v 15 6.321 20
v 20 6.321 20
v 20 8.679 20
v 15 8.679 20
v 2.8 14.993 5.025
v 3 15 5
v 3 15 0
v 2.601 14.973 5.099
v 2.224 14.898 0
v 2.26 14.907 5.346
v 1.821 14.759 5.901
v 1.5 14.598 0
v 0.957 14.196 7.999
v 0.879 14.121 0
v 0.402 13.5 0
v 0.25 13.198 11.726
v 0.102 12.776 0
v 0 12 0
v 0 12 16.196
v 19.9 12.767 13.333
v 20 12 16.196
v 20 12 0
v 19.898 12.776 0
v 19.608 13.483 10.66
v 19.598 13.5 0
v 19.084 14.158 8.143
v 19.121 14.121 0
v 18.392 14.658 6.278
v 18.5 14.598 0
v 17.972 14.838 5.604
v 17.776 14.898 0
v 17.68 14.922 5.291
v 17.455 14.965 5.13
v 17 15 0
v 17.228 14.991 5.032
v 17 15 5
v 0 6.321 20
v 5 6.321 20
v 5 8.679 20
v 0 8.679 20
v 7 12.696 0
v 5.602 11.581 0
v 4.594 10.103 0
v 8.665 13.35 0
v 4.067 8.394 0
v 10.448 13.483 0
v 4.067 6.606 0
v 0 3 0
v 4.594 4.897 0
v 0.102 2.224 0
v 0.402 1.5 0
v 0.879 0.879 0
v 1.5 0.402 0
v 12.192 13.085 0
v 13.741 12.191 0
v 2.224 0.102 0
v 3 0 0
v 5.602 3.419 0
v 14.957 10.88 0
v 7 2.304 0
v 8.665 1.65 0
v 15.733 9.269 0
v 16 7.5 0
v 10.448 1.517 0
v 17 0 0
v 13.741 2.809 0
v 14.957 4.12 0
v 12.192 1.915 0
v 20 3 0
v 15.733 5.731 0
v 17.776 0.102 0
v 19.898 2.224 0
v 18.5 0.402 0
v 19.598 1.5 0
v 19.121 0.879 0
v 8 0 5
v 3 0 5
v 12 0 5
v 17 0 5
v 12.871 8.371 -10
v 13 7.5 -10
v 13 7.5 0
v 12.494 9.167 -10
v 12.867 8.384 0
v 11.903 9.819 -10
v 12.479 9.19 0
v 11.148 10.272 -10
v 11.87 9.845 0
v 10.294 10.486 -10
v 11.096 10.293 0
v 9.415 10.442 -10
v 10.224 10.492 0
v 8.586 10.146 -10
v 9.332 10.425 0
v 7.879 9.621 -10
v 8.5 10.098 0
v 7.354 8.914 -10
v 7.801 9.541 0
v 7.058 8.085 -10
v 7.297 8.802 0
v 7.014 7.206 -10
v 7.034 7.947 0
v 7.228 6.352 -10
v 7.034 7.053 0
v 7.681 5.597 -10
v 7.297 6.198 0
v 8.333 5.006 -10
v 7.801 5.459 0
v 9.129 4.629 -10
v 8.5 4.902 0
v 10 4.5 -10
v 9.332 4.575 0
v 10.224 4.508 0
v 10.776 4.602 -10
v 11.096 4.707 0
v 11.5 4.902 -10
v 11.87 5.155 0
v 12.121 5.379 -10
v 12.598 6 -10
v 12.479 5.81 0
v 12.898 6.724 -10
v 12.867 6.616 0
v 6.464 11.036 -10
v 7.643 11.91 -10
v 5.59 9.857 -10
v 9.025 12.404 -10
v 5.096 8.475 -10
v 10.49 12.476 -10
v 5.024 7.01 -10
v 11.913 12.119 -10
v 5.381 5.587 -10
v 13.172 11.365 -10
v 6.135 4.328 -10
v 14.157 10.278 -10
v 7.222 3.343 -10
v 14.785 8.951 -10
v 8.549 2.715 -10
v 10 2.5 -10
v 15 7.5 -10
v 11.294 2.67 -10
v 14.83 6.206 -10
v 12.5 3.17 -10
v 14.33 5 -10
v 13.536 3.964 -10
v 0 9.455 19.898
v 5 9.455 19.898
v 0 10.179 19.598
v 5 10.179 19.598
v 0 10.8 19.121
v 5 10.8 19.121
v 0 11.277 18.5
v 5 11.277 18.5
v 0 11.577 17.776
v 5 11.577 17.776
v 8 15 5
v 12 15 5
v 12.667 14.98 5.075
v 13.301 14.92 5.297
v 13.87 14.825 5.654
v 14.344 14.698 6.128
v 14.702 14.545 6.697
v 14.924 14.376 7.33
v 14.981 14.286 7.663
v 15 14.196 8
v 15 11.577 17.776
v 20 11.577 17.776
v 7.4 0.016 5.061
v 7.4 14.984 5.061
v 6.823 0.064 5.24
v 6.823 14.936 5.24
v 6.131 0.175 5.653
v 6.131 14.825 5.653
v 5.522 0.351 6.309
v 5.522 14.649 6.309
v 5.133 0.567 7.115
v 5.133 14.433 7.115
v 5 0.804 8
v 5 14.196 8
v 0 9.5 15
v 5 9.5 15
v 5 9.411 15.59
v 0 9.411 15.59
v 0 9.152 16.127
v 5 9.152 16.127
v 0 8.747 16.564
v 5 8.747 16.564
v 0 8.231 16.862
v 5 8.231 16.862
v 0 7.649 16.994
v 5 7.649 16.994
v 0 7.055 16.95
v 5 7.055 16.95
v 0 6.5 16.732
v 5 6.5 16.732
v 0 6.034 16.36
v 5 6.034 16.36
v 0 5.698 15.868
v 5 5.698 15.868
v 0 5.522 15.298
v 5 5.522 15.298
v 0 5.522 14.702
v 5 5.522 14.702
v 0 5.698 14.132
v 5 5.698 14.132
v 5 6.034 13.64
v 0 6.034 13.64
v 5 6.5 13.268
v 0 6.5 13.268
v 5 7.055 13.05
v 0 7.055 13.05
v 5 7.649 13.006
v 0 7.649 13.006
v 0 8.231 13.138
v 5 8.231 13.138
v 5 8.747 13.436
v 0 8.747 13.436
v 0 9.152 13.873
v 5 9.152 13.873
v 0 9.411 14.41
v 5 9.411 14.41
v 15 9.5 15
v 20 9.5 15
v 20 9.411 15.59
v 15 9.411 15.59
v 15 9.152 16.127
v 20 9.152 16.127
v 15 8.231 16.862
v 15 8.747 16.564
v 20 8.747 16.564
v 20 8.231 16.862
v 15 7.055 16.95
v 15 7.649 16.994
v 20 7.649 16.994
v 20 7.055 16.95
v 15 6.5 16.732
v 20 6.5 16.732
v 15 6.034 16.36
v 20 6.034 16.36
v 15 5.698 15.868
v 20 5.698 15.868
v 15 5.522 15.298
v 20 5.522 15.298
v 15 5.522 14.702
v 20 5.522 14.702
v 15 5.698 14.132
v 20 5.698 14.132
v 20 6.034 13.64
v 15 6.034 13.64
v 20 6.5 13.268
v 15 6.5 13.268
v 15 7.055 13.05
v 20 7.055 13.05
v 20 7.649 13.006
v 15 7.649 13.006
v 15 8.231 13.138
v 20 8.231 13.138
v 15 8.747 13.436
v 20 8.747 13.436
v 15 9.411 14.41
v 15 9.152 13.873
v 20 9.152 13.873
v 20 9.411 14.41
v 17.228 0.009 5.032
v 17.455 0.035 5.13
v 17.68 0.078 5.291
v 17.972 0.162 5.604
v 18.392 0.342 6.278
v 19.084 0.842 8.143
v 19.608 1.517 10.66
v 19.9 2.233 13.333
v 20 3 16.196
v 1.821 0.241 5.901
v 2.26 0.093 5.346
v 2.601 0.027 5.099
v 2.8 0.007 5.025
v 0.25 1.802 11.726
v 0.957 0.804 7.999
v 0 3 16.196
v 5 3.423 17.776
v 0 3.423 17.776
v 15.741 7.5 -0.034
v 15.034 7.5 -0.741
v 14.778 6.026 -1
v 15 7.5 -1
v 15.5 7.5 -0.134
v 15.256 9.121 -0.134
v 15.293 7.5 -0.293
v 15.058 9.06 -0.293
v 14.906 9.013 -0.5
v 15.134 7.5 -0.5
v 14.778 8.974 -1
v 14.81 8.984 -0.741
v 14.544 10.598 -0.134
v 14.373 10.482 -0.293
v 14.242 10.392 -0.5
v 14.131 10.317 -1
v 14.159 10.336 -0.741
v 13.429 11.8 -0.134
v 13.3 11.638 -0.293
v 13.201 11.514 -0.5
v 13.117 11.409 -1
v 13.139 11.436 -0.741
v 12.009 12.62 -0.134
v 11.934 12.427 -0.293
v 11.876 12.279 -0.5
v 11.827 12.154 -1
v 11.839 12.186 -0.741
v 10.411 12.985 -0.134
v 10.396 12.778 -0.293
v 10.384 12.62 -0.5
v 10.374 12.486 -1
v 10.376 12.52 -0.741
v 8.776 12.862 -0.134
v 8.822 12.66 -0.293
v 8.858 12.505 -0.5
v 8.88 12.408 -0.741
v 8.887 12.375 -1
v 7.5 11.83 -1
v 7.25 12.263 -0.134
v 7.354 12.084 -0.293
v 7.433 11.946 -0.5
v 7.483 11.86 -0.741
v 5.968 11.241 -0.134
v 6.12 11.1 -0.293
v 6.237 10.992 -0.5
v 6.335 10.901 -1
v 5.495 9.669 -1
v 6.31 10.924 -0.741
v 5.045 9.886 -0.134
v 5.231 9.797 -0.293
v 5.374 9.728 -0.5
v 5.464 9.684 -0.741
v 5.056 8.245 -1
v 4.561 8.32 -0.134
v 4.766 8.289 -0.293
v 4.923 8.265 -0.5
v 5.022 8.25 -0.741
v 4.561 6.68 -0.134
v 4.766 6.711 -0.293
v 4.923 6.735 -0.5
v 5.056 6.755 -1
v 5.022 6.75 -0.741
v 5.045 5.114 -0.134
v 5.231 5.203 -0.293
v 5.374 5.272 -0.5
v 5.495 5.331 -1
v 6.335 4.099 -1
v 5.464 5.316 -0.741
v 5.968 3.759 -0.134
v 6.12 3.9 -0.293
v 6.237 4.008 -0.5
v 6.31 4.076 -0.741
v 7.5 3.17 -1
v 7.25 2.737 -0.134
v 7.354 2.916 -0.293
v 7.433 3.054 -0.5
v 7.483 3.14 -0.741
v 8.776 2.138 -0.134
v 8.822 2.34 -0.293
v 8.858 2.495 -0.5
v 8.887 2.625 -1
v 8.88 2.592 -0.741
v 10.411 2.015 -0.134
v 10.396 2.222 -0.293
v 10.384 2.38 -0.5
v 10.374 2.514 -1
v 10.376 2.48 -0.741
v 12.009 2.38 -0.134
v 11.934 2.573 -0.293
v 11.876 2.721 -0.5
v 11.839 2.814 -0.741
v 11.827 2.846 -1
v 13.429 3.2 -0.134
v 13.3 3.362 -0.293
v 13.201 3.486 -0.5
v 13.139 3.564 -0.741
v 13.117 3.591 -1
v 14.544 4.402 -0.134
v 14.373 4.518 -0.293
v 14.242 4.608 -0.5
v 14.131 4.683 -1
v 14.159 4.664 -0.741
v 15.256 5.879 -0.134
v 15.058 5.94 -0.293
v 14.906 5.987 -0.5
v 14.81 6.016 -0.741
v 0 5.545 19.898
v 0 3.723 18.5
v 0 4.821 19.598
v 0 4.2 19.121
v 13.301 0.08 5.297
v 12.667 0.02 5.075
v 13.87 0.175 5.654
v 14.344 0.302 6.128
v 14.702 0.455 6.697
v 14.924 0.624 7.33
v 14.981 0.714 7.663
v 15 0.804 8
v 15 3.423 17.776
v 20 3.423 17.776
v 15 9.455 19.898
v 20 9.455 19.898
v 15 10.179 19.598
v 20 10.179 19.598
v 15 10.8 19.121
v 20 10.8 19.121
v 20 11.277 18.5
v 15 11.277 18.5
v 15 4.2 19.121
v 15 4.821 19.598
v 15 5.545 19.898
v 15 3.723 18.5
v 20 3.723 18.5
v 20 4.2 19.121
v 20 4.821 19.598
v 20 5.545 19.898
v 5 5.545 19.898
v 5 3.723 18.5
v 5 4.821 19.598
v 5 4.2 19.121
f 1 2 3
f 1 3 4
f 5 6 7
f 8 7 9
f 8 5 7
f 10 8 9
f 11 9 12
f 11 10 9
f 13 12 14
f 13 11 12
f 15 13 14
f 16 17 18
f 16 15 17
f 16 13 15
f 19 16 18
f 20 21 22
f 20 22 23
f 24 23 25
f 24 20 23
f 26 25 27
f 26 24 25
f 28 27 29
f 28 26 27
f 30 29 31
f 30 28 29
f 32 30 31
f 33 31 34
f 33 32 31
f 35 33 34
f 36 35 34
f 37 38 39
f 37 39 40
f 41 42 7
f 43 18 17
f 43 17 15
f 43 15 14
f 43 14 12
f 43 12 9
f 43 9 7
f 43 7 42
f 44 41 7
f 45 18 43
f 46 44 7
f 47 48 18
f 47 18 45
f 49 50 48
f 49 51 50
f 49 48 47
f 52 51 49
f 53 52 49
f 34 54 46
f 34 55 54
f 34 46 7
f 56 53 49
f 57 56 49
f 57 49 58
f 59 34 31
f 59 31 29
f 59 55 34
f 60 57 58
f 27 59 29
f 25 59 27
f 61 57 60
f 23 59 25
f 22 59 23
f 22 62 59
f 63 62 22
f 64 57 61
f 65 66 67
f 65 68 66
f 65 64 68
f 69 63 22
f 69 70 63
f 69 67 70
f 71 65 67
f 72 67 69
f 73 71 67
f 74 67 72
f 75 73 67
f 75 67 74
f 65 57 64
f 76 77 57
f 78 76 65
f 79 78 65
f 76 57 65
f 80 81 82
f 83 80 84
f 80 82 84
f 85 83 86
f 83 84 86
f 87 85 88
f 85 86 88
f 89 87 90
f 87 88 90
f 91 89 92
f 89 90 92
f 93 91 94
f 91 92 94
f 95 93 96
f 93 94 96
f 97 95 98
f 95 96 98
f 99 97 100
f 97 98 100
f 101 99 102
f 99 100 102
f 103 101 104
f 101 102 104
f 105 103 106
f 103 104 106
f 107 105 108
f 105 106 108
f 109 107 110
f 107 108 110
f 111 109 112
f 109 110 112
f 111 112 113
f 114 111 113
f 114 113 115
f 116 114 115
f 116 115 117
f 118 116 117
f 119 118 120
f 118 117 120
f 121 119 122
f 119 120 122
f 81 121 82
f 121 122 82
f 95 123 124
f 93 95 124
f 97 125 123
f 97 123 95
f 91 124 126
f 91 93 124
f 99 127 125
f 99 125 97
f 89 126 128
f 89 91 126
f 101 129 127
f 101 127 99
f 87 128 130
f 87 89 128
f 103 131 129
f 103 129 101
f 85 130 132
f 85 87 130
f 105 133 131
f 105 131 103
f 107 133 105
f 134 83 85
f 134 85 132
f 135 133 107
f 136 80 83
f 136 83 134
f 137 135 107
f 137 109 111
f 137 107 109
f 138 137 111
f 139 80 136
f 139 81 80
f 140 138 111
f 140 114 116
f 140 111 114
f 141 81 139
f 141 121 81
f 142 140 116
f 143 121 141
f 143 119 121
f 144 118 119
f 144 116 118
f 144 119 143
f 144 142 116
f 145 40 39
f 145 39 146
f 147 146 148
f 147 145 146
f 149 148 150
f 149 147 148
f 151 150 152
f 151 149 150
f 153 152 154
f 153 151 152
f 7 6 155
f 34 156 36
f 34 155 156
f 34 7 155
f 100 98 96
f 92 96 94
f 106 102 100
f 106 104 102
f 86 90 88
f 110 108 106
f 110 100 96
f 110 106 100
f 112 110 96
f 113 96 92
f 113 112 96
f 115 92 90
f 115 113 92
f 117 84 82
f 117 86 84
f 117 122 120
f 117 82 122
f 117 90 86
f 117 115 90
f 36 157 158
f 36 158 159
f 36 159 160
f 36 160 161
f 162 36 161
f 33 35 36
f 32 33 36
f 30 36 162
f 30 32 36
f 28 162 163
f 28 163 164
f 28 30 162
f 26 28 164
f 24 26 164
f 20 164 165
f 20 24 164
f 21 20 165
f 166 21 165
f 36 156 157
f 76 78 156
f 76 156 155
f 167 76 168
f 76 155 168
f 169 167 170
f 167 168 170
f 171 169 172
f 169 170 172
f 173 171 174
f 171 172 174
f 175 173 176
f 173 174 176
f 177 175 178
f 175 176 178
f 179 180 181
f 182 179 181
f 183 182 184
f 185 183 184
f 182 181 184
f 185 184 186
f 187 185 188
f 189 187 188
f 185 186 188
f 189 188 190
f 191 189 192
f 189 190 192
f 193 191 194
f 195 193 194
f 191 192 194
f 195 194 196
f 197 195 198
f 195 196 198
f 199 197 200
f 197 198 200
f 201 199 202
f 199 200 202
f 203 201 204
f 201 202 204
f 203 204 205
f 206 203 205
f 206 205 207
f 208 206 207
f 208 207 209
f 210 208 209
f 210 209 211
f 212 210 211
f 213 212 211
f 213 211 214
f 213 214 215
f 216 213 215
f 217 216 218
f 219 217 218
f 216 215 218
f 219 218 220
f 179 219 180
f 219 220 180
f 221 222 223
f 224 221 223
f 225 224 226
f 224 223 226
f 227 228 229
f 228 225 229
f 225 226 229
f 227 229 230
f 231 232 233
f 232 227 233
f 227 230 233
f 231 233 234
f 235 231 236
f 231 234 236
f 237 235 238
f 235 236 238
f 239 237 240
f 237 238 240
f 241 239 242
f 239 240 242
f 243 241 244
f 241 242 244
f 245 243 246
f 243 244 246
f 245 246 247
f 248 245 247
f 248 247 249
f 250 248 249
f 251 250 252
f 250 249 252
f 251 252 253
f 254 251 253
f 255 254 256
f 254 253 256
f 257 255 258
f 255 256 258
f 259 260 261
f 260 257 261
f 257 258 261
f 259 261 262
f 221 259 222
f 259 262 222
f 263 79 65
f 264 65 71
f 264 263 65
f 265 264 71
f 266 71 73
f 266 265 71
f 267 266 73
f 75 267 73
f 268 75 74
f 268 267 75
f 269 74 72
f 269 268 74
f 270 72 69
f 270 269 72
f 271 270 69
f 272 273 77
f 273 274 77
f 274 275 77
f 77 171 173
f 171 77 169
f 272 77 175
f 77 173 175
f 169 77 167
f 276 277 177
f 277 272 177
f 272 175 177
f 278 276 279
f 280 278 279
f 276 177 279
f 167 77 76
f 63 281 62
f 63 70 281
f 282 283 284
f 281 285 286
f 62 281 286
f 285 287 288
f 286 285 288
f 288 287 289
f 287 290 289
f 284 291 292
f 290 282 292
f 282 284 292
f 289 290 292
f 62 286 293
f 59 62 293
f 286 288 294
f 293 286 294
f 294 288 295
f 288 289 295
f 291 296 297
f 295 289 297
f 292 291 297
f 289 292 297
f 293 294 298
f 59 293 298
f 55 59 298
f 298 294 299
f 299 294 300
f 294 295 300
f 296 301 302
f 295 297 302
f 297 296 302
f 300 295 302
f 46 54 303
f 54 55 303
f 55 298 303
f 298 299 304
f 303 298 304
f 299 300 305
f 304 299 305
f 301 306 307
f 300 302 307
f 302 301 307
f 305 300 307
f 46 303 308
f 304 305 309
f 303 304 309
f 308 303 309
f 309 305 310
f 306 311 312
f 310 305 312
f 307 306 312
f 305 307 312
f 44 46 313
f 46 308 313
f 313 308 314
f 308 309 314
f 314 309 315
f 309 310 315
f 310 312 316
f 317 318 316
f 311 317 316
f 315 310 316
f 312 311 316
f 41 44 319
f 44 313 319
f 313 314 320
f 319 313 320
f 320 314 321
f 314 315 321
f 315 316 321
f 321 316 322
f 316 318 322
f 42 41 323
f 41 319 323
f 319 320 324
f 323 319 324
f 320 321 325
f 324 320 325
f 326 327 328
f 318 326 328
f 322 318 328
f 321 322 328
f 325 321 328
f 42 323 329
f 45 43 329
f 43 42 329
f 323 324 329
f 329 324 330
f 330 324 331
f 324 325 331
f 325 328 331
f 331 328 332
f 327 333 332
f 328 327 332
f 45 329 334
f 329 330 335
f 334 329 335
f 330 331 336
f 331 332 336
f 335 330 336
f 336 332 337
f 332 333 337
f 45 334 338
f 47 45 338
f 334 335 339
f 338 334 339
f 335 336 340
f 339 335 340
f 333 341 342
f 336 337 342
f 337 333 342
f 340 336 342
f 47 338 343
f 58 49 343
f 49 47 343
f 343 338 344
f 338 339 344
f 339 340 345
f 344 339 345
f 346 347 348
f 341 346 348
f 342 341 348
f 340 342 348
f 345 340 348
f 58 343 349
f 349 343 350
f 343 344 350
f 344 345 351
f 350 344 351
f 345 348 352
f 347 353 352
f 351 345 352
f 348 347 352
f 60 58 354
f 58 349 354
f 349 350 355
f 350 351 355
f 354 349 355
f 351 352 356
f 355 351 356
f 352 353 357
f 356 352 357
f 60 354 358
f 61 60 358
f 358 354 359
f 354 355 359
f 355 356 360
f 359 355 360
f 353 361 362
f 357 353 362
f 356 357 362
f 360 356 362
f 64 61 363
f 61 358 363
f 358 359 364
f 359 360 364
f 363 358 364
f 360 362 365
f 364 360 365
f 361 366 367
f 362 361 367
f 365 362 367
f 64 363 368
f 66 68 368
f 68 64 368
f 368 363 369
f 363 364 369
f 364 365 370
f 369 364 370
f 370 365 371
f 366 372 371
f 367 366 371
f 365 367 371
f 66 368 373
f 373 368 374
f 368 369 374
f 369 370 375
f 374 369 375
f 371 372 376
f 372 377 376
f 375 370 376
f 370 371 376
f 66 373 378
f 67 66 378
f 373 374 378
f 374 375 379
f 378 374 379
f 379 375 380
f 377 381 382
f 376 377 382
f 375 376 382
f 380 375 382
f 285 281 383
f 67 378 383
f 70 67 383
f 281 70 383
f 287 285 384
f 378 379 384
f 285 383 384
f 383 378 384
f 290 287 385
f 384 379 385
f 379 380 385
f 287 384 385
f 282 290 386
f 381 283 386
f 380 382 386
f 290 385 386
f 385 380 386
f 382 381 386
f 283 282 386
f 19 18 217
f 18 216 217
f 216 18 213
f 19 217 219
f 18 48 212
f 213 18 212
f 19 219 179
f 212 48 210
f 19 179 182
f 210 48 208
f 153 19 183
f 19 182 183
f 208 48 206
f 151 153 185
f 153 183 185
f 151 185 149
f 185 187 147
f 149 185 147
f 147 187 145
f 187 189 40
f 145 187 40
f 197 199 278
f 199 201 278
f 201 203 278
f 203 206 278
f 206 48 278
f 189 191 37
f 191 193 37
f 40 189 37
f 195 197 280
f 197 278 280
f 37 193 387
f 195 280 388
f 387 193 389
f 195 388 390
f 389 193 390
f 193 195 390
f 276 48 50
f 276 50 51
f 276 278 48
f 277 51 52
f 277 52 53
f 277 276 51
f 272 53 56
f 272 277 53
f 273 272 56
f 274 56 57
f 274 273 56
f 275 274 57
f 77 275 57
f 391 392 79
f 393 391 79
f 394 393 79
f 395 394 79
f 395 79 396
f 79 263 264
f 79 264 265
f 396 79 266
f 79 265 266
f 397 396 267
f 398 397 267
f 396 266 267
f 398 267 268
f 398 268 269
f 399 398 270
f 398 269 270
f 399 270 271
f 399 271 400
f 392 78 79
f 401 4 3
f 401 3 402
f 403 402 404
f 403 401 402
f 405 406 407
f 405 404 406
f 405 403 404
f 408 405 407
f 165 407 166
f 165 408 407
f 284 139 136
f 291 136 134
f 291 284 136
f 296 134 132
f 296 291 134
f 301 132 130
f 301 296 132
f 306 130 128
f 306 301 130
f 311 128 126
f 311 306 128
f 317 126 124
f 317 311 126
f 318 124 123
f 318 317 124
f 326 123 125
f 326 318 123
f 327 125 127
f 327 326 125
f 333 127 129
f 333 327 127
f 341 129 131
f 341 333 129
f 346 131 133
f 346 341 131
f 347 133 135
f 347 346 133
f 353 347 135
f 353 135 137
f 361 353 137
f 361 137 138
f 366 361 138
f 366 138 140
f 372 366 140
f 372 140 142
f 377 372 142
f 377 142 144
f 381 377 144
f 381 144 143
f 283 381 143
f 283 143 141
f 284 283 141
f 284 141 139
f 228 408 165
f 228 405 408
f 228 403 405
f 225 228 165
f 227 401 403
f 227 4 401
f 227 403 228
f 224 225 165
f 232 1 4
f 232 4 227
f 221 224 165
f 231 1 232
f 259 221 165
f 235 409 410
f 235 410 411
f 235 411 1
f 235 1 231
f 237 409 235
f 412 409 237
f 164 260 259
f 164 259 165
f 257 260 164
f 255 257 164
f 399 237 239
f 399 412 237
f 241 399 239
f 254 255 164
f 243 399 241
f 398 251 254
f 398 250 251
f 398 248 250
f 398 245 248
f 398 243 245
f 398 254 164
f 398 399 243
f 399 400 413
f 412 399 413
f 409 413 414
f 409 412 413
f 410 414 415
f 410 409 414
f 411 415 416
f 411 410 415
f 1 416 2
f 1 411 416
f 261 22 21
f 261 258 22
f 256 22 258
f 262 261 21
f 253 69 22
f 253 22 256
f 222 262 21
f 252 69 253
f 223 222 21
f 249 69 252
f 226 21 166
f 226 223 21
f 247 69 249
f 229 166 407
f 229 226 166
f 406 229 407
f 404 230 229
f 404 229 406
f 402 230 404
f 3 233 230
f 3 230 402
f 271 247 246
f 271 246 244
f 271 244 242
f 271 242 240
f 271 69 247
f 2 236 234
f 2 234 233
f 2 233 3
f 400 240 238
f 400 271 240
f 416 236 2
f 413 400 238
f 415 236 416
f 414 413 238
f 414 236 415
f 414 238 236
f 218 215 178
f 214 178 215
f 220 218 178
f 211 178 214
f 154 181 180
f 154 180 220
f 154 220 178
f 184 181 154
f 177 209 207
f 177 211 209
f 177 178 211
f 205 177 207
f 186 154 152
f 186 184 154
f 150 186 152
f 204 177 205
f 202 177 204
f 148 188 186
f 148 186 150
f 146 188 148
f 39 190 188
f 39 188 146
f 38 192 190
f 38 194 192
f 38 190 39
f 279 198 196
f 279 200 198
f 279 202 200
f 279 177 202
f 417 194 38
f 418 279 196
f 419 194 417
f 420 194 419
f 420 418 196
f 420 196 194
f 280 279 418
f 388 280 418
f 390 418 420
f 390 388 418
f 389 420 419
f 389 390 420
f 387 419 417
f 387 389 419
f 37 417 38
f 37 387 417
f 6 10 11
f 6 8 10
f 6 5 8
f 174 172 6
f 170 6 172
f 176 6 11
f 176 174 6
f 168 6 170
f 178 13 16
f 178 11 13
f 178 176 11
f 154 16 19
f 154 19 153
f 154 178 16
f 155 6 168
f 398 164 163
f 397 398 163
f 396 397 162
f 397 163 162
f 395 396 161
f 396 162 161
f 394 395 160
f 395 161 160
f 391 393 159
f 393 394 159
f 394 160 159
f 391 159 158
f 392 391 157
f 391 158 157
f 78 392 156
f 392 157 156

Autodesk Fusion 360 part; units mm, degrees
sketch "Sketch1" plane through (0, 0, 0) normal (0, 1, 0) x (1, 0, 0)
  line L0 (0, 0) -> (20, 0)
  line L1 (20, 0) -> (20, -20)
  line L2 (20, -20) -> (15, -20)
  line L3 (15, -20) -> (15, -5)
  line L4 (15, -5) -> (5, -5)
  line L5 (5, -5) -> (5, -20)
  line L6 (5, -20) -> (0, -20)
  line L7 (0, 0) -> (0, -20)
  dimension "d1" = 5
  dimension "d2" = 15
  dimension "d3" = 10
extrude "Extrude1" add sketch "Sketch1" along normal blind 15
sketch "Sketch2" plane through (20, 0, 0) normal (1, 0, 0) x (0, 1, 0)
  line L0 (0, 20) -> (0, 0)
  line L1 (0, 0) -> (15, 0)
  line L2 (15, 0) -> (15, 20)
  line L3 (15, 20) -> (0, 20)
  line L4 (7.5, 20) -> (7.5, 15)
  circle A0 centre (7.5, 15) radius 2
  dimension "d6" = 5
  dimension "d7" = 4
extrude "Extrude2" cut sketch "Sketch2" against normal through all contours A0
sketch "Sketch3" plane through (0, 0, 0) normal (0, 0, -1) x (1, 0, 0)
  line L0 (20, 0) -> (0, 0)
  line L1 (0, 0) -> (0, -15)
  line L2 (0, -15) -> (20, -15)
  line L3 (20, -15) -> (20, 0)
  line L4 (10, 0) -> (10, -7.5)
  circle A0 centre (10, -7.5) radius 5
  circle A1 centre (10, -7.5) radius 3
  dimension "d9" = 7.5
  dimension "d10" = 10
  dimension "d11" = 6
extrude "Extrude3" add sketch "Sketch3" along normal blind 10 contours A0
sketch "Sketch4" plane through (20, 0, 0) normal (1, 0, 0) x (0, 1, 0)
  circle A0 centre (7.5, 15) radius 2
  line L0 (0, 20) -> (0, 0)
  line L1 (0, 0) -> (15, 0)
  line L2 (15, 0) -> (15, 20)
  line L3 (15, 20) -> (0, 20)
  line L4 (0, 5) -> (4.0192, 20)
  line L5 (0, 5) -> (15, 5)
  line L6 (15, 5) -> (10.9808, 20)
  dimension "d14" = 75
  dimension "d15" = 75
extrude "Extrude4" cut sketch "Sketch4" against normal through all contours L0 L3 L4 | L2 L3 L6
fillet "Fillet1" radius 3 4 edges at (2.5, 4.0192, 20) (2.5, 10.9808, 20) (17.5, 4.0192, 20) (17.5, 10.9808, 20)
fillet "Fillet2" radius 3 6 edges at (0, 0, 2.5) (20, 0, 2.5) (20, 15, 2.5) (5, 7.5, 5) (15, 7.5, 5) (0, 15, 2.5)
fillet "Fillet3" radius 1 1 edges at (5.3384, 5.6919, 0)
